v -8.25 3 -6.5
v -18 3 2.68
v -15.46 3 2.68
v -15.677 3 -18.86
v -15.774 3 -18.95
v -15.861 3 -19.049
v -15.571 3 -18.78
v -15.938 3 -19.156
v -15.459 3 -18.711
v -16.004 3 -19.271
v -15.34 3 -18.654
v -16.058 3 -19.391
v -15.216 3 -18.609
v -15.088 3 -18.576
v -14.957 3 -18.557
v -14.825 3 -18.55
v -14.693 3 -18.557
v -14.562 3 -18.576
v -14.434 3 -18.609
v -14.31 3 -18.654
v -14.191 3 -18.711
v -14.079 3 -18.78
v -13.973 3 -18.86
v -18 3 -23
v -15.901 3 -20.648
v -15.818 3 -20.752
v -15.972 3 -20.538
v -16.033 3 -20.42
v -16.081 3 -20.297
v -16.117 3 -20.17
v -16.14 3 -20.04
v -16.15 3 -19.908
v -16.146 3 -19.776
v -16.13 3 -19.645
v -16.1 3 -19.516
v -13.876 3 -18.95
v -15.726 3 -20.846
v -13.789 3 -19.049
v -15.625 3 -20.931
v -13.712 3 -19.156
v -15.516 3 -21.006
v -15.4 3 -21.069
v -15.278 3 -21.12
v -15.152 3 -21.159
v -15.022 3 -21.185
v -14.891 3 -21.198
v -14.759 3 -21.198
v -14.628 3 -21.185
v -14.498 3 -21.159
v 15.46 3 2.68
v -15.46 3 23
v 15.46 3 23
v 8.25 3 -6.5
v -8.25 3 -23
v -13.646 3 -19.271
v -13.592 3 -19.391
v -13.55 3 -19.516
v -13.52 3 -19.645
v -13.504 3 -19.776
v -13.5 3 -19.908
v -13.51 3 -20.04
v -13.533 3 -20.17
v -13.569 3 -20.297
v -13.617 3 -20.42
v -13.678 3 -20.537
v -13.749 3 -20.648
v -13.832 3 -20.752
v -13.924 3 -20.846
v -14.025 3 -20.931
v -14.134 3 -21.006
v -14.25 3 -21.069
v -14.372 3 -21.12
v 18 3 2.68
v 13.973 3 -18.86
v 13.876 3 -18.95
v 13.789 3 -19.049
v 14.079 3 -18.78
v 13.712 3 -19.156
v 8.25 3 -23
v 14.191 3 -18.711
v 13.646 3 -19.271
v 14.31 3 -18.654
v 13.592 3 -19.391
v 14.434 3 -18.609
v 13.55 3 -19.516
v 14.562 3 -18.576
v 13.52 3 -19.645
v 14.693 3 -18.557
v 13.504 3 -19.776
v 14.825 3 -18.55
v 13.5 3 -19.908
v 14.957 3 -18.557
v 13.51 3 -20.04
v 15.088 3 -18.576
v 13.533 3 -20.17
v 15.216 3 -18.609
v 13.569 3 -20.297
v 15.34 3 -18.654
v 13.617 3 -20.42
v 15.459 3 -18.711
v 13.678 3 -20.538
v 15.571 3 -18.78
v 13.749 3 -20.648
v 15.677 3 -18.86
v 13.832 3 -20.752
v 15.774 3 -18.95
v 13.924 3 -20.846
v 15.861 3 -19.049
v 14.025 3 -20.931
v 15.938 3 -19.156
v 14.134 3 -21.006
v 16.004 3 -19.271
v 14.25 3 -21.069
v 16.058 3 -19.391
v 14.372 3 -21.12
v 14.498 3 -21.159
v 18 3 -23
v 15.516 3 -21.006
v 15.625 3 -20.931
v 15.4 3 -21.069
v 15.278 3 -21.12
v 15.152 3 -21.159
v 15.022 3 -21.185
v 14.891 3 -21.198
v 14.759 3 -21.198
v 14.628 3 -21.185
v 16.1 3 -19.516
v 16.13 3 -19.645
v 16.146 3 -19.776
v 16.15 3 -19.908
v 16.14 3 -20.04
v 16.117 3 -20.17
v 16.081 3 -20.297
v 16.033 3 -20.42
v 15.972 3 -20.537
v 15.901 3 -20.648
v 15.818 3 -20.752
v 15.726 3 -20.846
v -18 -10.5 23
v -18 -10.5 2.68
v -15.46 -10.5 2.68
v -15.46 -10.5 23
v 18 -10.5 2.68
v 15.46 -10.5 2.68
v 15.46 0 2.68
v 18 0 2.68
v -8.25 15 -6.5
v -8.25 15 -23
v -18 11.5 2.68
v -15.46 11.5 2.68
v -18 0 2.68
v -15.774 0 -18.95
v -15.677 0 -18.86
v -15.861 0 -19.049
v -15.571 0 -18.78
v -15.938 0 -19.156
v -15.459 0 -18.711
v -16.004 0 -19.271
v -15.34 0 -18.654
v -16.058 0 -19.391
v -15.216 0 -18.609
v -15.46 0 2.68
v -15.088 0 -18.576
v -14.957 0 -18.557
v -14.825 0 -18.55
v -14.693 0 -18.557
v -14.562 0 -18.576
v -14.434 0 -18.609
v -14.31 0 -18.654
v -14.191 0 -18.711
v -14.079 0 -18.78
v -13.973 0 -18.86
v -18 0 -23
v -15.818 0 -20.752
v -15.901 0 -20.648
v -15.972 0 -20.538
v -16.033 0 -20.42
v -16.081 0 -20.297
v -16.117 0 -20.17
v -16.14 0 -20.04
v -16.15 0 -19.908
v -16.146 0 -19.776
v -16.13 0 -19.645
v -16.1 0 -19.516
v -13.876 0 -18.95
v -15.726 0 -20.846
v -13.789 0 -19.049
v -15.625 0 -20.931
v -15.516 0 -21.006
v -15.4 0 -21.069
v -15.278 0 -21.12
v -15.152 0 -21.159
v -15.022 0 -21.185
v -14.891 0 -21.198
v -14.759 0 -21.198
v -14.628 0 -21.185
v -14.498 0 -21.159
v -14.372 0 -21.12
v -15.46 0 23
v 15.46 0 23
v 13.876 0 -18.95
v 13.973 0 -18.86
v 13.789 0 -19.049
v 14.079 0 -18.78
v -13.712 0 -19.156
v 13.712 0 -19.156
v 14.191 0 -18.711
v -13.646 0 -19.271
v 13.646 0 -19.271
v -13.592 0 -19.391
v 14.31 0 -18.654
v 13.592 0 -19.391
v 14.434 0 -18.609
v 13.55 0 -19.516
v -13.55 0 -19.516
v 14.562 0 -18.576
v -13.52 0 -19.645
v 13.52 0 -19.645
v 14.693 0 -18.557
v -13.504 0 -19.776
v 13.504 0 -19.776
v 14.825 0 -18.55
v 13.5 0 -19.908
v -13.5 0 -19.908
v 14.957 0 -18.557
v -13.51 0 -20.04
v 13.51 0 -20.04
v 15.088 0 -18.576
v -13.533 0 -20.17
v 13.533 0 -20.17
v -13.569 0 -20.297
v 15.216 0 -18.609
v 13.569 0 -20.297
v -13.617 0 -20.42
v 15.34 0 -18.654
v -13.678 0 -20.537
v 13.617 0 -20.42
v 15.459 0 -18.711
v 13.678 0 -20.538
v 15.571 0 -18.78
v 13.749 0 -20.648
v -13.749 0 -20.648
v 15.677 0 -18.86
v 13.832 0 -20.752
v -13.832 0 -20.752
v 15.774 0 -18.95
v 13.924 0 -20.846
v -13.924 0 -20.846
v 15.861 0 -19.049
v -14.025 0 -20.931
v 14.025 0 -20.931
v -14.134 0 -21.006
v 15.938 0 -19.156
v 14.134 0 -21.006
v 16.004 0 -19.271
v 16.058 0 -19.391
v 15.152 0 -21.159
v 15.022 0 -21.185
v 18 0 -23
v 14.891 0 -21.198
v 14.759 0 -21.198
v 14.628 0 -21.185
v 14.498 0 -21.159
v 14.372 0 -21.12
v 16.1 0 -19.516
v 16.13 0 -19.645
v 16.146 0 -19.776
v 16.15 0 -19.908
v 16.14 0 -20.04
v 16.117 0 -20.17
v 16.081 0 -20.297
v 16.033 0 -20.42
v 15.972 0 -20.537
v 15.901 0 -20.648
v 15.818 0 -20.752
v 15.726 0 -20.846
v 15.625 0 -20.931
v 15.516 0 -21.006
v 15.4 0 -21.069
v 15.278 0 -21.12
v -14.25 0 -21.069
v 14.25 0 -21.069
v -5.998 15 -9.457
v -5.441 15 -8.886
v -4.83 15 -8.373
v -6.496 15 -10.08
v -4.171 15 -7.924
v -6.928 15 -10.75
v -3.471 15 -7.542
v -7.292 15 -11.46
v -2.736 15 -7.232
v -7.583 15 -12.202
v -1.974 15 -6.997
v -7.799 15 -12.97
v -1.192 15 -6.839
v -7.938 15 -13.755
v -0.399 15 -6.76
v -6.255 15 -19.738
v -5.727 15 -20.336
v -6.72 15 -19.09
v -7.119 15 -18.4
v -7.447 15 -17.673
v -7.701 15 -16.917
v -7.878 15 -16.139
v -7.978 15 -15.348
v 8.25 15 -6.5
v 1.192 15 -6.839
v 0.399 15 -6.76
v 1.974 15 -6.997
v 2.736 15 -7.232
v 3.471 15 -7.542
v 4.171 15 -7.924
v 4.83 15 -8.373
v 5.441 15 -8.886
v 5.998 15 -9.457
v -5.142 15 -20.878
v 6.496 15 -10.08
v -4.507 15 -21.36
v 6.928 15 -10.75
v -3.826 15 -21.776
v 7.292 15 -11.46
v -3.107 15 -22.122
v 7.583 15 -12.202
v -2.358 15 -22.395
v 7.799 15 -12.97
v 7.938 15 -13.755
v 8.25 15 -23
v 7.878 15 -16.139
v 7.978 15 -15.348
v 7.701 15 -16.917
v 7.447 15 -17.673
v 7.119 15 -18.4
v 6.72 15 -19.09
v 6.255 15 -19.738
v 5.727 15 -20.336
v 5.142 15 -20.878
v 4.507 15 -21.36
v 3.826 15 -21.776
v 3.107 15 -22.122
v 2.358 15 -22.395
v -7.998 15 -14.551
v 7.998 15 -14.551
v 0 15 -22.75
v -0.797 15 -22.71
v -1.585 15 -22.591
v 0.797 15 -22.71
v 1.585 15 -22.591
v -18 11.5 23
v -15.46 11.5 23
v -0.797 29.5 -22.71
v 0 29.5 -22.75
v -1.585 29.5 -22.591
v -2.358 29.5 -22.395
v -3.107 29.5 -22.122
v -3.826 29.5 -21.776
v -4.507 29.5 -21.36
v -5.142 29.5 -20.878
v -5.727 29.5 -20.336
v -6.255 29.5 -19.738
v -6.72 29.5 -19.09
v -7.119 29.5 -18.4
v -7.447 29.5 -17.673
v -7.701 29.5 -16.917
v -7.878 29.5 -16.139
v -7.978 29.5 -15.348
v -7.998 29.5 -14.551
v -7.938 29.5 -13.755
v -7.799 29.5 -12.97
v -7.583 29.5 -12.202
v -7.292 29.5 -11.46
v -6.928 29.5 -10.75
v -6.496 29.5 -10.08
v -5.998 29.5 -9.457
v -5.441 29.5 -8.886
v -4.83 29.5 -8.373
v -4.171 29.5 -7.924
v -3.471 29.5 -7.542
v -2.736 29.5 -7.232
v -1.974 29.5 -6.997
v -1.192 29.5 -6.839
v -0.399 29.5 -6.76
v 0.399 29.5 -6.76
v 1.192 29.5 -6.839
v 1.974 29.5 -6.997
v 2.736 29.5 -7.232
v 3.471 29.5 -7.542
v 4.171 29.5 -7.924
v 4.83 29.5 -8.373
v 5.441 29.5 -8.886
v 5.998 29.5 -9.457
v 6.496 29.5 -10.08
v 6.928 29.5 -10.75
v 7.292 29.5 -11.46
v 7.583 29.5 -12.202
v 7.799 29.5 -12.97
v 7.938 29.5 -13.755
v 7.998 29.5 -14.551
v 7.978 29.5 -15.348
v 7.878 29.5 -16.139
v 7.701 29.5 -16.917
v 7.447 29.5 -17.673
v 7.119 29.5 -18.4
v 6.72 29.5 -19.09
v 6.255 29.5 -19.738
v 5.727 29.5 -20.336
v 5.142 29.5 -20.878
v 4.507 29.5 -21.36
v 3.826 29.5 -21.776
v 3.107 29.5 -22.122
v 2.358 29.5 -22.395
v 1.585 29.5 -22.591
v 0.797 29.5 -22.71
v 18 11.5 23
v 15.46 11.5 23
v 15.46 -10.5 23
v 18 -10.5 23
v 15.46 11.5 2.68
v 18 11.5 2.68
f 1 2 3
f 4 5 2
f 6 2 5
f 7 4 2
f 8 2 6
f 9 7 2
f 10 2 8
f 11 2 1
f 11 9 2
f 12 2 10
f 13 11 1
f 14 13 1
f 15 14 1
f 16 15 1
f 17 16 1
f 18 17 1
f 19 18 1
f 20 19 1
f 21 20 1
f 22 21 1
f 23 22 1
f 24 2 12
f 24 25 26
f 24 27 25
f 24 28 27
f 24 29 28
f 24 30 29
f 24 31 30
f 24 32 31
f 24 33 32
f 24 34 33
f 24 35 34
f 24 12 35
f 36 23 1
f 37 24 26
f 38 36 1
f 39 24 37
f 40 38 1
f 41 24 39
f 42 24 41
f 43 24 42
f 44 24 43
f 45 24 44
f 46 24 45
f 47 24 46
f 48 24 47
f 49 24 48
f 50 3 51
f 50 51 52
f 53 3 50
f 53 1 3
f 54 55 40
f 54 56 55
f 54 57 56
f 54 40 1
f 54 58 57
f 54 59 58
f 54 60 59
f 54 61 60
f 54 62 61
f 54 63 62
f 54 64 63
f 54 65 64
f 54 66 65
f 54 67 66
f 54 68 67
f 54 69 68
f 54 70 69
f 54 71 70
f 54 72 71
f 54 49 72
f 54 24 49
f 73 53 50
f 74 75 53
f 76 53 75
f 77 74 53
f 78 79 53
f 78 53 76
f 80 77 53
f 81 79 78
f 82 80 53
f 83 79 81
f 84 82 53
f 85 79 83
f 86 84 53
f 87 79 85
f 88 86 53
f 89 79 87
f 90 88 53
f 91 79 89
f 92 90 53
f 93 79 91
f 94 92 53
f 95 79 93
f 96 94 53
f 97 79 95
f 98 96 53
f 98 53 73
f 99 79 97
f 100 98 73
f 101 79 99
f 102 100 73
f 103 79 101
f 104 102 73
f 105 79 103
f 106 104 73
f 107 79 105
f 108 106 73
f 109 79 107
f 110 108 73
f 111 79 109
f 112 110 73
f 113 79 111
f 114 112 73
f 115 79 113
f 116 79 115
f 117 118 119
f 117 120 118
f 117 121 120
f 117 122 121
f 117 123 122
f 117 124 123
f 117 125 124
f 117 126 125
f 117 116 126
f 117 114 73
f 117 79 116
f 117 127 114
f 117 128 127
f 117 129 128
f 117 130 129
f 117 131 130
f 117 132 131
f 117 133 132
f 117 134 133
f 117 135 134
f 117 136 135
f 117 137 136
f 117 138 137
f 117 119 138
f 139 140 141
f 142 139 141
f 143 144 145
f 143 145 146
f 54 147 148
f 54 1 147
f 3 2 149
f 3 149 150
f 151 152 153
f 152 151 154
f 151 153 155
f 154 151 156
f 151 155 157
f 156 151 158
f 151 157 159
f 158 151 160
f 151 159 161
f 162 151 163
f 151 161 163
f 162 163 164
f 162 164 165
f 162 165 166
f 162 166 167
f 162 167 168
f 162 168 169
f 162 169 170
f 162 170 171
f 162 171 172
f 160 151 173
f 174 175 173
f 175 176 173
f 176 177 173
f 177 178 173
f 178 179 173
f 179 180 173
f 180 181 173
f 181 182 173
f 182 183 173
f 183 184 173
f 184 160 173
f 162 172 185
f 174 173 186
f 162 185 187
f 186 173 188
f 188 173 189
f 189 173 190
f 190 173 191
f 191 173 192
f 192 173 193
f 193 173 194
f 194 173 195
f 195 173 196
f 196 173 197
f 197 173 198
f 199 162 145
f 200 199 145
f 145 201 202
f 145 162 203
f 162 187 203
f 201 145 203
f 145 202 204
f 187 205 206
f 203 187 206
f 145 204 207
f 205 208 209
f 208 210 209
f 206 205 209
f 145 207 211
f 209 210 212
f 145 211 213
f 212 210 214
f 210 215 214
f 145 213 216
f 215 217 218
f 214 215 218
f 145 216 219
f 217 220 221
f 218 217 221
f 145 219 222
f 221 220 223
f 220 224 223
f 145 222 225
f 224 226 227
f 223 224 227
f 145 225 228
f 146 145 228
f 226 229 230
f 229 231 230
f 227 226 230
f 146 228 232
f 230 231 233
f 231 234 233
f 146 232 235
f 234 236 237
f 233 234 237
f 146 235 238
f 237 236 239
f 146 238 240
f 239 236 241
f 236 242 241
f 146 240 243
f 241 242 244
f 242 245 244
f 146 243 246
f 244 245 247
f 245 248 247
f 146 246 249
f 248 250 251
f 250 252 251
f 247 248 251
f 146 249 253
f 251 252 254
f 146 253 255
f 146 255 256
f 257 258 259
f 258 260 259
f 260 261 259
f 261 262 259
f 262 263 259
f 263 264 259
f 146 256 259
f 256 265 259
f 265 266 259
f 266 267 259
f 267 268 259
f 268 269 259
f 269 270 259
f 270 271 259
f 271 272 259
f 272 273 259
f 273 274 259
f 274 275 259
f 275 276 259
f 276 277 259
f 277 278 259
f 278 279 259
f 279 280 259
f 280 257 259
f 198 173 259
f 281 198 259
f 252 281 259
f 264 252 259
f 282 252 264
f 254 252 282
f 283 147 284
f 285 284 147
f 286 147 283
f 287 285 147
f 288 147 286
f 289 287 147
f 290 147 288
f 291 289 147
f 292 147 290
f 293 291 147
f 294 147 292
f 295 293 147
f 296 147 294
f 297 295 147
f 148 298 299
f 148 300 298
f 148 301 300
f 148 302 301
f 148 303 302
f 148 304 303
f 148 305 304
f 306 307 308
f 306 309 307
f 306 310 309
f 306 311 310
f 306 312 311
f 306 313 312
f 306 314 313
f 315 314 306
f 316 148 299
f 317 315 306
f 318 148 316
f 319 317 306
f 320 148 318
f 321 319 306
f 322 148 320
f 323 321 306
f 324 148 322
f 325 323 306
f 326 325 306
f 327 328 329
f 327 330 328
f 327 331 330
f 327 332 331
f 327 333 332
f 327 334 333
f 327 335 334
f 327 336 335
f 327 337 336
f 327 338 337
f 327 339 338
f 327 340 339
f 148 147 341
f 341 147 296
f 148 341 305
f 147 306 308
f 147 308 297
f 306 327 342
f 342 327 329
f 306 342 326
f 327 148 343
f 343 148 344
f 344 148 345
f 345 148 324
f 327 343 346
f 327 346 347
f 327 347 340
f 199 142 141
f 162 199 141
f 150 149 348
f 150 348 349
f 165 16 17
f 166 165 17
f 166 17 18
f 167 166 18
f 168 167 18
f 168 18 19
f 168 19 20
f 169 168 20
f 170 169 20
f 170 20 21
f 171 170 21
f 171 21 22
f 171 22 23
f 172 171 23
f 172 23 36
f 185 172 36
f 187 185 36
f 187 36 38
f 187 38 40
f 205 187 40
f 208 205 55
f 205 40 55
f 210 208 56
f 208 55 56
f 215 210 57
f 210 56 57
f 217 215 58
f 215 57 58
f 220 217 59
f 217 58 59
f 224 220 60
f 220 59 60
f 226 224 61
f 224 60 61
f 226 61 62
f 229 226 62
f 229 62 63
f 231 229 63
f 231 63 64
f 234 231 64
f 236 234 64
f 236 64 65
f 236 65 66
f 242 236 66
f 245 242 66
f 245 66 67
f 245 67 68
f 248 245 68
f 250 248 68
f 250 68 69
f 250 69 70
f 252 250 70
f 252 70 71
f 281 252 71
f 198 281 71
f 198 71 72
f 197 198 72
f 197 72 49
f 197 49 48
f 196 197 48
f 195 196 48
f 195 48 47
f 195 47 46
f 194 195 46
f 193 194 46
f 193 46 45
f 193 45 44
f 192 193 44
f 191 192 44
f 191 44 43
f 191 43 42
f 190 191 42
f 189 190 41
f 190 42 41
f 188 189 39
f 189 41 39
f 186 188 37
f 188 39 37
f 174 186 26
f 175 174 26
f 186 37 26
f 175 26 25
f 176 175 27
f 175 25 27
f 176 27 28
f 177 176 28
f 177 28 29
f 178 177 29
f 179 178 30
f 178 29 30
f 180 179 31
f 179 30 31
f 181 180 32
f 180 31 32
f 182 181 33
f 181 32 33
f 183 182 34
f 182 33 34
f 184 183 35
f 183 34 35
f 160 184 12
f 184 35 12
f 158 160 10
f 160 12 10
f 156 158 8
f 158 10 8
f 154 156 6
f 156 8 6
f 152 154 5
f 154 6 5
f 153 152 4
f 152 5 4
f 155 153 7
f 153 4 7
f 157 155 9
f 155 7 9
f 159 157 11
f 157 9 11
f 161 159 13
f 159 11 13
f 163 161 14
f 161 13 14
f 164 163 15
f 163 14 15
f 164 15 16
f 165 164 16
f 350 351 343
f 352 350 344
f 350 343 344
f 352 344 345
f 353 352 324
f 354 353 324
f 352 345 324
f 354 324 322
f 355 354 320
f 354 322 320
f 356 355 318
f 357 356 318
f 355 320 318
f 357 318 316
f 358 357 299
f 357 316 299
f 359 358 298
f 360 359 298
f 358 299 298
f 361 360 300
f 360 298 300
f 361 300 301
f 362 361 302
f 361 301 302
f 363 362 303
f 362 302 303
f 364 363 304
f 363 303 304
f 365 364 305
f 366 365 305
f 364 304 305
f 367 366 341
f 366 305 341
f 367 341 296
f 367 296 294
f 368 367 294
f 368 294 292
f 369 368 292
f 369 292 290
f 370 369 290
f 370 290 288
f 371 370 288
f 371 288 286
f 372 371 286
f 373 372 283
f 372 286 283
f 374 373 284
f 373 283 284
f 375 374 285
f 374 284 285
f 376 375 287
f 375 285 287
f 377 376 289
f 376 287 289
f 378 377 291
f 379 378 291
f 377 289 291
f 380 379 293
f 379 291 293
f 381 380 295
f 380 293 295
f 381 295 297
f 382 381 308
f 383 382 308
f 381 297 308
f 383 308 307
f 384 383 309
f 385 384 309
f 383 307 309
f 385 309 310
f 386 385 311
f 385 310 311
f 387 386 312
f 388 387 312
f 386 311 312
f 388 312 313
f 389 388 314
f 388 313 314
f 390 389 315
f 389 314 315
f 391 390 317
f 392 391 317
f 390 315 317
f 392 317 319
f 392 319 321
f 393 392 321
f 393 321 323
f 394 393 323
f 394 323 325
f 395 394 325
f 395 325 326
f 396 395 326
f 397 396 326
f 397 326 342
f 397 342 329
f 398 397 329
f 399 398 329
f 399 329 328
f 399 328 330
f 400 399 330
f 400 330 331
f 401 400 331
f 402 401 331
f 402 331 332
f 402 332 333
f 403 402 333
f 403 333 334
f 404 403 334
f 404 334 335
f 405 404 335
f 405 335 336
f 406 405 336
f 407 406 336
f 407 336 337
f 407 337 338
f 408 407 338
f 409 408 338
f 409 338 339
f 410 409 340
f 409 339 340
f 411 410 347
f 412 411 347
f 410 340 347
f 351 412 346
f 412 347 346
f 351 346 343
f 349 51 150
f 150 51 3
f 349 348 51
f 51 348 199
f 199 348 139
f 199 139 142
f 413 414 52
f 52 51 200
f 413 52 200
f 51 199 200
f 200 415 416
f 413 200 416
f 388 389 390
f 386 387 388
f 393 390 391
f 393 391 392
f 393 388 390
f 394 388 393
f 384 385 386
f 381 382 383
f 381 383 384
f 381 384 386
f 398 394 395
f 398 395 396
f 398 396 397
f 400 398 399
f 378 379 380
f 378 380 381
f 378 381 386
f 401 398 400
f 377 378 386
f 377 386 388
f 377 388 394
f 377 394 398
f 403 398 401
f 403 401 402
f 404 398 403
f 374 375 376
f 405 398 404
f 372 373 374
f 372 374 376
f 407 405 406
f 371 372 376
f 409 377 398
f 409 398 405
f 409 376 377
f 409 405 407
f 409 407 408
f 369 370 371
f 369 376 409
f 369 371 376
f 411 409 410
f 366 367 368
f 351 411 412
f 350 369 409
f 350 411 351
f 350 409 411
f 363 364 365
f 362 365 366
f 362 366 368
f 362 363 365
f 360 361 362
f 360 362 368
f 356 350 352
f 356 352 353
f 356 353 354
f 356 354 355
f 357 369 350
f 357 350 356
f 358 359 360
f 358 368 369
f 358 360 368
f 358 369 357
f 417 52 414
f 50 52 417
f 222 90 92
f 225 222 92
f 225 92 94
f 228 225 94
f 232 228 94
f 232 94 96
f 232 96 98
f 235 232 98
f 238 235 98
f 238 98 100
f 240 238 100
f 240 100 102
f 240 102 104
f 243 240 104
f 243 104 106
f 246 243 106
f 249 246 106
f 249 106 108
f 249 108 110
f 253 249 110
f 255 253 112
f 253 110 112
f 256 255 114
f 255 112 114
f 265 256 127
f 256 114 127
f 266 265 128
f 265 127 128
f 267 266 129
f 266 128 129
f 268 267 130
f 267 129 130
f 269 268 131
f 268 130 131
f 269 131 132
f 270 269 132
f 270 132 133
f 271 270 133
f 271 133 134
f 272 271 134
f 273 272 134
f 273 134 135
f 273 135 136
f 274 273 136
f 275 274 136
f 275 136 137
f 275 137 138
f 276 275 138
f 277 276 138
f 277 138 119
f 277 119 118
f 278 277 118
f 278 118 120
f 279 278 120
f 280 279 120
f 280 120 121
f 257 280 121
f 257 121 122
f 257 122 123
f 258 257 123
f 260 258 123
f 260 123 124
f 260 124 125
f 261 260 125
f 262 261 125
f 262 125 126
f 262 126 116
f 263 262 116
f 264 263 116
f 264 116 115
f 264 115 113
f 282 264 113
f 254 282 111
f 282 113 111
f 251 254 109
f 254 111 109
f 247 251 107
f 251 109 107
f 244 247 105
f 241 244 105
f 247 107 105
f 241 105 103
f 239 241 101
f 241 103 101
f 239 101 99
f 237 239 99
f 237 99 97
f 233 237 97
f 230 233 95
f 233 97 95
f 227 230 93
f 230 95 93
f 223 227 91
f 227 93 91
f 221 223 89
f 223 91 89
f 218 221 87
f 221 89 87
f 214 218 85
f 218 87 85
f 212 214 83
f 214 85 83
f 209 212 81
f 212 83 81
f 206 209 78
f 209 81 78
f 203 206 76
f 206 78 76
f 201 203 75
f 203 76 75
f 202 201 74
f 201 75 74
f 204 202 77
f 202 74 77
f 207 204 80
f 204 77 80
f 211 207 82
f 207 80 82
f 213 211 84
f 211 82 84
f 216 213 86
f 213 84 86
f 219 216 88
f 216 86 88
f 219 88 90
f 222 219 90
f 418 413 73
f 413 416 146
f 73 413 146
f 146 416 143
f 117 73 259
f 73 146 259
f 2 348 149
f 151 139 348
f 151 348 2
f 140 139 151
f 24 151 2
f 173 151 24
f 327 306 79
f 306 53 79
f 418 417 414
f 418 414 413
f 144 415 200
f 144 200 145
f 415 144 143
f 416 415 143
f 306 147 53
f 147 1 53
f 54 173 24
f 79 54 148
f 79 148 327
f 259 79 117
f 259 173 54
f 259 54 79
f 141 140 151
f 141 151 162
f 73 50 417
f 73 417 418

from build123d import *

# Parameters (mm, degrees)
SKETCH_1_W           = 36
SKETCH_1_H           = 46
EXTRUDE_1_DEPTH      = 3
EXTRUDE_2_DEPTH      = 8.5
EXTRUDE_2_DEPTH_BACK = 13.5
SKETCH_2_W           = 2.54
SKETCH_2_H           = 20.32
SKETCH_2_W_2         = 16.5
SKETCH_2_H_2         = 16.5
SKETCH_3_W           = 16.5
SKETCH_3_H           = 16.5
EXTRUDE_3_DEPTH      = 3.5
SKETCH_4_R           = 8
EXTRUDE_4_DEPTH      = 14.5
SKETCH_5_R           = 1.325
CUT_EXTRUDE_1_DEPTH  = 14.5
SKETCH_7_W           = 16.5
SKETCH_7_H           = 10.5
CUT_EXTRUDE_2_DEPTH  = 31.5


with BuildPart() as part:
    # 草图1 → 凸台-拉伸1 (new body)
    with BuildSketch(Plane(origin=(0, 0, 0), x_dir=(1, 0, 0), z_dir=(0, 1, 0))):
        Rectangle(SKETCH_1_W, SKETCH_1_H)
    extrude(amount=EXTRUDE_1_DEPTH)

    # 草图2 → 凸台-拉伸2 (add, two sides: drawn at the far end of the back side and taken through both)
    with BuildSketch(Plane(origin=(0, 3, 0), x_dir=(1, 0, 0), z_dir=(0, 1, 0)).offset(-EXTRUDE_2_DEPTH_BACK)):
        with Locations((16.73, -12.84)):
            Rectangle(SKETCH_2_W, SKETCH_2_H)
        with Locations((-16.73, -12.84)):
            Rectangle(SKETCH_2_W, SKETCH_2_H)
        with Locations((0, 14.75)):
            Rectangle(SKETCH_2_W_2, SKETCH_2_H_2)
    extrude(amount=EXTRUDE_2_DEPTH + EXTRUDE_2_DEPTH_BACK)

    # 草图3 → 凸台-拉伸3 (add)
    with BuildSketch(Plane(origin=(0, 11.5, 0), x_dir=(1, 0, 0), z_dir=(0, 1, 0))):
        with Locations((0, 14.75)):
            Rectangle(SKETCH_3_W, SKETCH_3_H)
    extrude(amount=EXTRUDE_3_DEPTH)

    # 草图4 → 凸台-拉伸4 (add)
    with BuildSketch(Plane(origin=(0, 15, 0), x_dir=(1, 0, 0), z_dir=(0, 1, 0))):
        with Locations(Location((0, 14.75, 0), (0, 0, 90))):
            Circle(SKETCH_4_R)
    extrude(amount=EXTRUDE_4_DEPTH)

    # 草图5 → 切除-拉伸1 (cut)
    with BuildSketch(Plane(origin=(0, 3, 0), x_dir=(1, 0, 0), z_dir=(0, 1, 0))):
        with Locations(Location((-14.825, 19.875, 0), (0, 0, 270))):
            Circle(SKETCH_5_R)
        with Locations(Location((14.825, 19.875, 0), (0, 0, 270))):
            Circle(SKETCH_5_R)
    extrude(amount=-CUT_EXTRUDE_1_DEPTH, mode=Mode.SUBTRACT)

    # 草图7 → 切除-拉伸2 (cut)
    with BuildSketch(Plane.ZY.offset(8.25)):
        with Locations((-14.75, -5.25)):
            Rectangle(SKETCH_7_W, SKETCH_7_H)
    extrude(amount=-CUT_EXTRUDE_2_DEPTH, mode=Mode.SUBTRACT)


solid = part.part
